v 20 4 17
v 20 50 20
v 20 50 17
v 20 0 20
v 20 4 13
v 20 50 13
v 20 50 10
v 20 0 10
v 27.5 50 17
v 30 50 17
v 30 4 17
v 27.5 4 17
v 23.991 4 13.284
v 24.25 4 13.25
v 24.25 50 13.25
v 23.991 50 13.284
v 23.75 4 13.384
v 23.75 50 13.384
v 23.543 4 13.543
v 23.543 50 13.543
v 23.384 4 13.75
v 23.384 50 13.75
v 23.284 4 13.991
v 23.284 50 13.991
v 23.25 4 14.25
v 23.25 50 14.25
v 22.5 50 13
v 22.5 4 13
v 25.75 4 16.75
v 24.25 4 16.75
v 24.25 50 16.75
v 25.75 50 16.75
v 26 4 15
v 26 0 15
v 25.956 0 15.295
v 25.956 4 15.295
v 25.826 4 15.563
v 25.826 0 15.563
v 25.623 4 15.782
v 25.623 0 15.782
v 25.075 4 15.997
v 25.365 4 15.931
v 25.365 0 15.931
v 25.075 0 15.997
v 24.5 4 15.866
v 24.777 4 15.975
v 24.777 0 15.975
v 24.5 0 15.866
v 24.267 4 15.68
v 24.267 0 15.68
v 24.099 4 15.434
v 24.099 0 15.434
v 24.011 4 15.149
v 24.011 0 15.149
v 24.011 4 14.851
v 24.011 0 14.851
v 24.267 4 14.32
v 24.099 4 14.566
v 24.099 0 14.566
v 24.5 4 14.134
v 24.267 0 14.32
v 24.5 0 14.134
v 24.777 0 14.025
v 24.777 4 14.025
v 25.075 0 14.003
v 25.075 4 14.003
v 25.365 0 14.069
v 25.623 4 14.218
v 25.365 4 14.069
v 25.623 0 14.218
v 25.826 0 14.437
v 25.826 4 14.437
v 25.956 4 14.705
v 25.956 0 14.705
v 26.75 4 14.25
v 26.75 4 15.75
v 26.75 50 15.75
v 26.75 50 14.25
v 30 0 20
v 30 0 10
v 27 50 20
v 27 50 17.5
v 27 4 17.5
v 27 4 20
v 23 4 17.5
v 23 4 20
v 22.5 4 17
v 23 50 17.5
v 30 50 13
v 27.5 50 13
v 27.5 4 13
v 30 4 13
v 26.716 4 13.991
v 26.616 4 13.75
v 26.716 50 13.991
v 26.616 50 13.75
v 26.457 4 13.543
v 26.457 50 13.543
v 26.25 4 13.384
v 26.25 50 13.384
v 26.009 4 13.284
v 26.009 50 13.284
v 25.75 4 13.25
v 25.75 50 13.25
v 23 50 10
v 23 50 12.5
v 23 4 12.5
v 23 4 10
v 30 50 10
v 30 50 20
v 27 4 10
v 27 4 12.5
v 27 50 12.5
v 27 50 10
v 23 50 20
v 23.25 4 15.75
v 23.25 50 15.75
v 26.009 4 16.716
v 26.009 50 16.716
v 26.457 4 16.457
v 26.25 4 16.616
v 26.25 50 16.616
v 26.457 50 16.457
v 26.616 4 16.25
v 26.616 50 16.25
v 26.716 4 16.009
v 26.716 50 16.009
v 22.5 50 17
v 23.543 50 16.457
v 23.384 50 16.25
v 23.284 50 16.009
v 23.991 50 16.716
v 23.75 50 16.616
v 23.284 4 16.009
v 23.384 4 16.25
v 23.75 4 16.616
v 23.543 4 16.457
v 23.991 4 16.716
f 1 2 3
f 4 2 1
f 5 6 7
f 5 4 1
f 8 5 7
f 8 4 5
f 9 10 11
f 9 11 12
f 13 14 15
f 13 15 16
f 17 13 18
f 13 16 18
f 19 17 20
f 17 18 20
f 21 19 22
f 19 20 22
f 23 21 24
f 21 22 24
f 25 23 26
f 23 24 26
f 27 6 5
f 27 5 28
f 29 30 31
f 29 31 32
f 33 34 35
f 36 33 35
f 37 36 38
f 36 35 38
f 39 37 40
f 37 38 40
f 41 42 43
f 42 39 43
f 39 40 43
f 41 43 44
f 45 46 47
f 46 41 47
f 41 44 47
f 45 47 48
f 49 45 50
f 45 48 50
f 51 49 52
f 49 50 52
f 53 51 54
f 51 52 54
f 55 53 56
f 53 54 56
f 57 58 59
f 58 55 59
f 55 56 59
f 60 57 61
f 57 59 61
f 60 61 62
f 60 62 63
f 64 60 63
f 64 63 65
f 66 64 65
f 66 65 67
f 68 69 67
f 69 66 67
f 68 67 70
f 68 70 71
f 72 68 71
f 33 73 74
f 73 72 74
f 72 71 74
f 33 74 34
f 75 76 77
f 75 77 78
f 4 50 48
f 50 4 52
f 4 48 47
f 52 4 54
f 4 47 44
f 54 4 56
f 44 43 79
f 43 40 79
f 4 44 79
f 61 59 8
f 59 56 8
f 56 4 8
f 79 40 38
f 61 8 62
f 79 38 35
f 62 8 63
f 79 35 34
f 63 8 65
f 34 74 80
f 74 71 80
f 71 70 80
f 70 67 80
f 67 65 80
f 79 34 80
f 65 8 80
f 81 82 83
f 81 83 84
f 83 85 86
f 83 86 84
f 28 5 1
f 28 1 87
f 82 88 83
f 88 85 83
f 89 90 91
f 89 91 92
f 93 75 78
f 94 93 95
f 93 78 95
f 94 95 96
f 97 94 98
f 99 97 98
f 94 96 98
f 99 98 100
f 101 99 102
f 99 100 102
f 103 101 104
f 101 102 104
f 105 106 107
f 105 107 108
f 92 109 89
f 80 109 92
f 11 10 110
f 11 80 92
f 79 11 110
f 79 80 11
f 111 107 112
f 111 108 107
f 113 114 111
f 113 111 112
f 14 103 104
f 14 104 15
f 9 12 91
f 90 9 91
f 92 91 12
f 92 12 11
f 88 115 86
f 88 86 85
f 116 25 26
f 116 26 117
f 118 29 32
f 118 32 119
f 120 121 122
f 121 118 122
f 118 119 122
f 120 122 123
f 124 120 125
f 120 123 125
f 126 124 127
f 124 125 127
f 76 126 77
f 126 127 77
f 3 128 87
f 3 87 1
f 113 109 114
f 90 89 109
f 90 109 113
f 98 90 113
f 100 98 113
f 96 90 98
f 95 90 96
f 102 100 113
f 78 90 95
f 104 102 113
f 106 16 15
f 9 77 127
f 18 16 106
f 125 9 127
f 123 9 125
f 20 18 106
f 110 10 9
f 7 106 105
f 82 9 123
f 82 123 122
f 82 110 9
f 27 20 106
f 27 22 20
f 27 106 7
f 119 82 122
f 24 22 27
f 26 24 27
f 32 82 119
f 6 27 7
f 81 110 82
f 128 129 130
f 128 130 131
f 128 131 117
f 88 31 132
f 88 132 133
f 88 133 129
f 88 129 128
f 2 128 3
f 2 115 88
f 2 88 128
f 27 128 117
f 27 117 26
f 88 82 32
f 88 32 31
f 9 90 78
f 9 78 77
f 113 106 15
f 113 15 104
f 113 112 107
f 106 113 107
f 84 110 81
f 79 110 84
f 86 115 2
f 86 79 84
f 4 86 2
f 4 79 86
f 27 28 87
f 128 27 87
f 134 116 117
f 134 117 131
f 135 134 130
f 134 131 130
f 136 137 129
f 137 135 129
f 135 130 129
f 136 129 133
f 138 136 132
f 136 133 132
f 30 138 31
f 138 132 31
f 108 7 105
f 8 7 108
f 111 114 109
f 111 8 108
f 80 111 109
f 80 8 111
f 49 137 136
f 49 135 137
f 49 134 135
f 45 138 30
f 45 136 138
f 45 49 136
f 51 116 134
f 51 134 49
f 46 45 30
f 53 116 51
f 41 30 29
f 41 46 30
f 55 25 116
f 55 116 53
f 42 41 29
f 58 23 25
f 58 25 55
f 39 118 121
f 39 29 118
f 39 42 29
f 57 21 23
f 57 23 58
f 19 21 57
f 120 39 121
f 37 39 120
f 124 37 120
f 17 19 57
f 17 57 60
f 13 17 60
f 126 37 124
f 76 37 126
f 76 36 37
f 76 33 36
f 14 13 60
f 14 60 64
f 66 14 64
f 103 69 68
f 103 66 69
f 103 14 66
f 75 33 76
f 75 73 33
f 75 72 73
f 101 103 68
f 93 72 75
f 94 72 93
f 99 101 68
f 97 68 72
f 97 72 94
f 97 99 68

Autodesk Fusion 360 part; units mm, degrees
sketch "Esquisse1" plane through (0, 0, 0) normal (0, 1, 0) x (1, 0, 0)
  line L0 (30, -20) -> (20, -20)
  line L1 (20, -20) -> (20, -10)
  line L2 (20, -10) -> (30, -10)
  line L3 (30, -10) -> (30, -20)
  circle A0 centre (25, -15) radius 1
  dimension "d1" = 10
  dimension "d2" = 10
  dimension "d22" = 2
extrude "Extrusion3" add sketch "Esquisse1" along normal blind 4
sketch "Esquisse3" plane through (0, 4, 0) normal (0, 1, 0) x (-1, 0, 0)
  circle A0 centre (-25, 15) radius 1
  line L0 (-30, 10) -> (-20, 10)
  line L1 (-20, 10) -> (-20, 20)
  line L2 (-20, 20) -> (-30, 20)
  line L3 (-30, 20) -> (-30, 10)
  line L4 (-30, 20) -> (-30, 17)
  line L5 (-30, 17) -> (-27.5, 17)
  line L6 (-27.5, 17) -> (-27.5, 15)
  line L7 (-27.5, 15) -> (-27, 15)
  line L8 (-25, 16.75) -> (-25, 17.5)
  line L9 (-25, 17.5) -> (-27, 17.5)
  line L10 (-27, 17.5) -> (-27, 20)
  line L11 (-27, 20) -> (-30, 20)
  line L12 (-30, 17) -> (-30, 20)
  line L13 (-26.75, 15) -> (-27.625, 15)
  line L14 (-25, 17.5) -> (-25, 17)
  line L15 (-25, 16.75) -> (-26.75, 16.75)
  line L16 (-26.75, 16.75) -> (-26.75, 15)
  line L17 (-27.5, 13) -> (-30, 13)
  line L18 (-30, 13) -> (-30, 10)
  line L19 (-30, 10) -> (-27, 10)
  line L20 (-27, 12.5) -> (-25, 12.5)
  line L21 (-25, 12.5) -> (-25, 13)
  line L22 (-27, 10) -> (-27, 12.5)
  line L23 (-25, 13.25) -> (-25, 12.375)
  line L24 (-26.75, 13.25) -> (-25, 13.25)
  line L25 (-26.75, 15) -> (-26.75, 13.25)
  line L26 (-26.75, 15) -> (-27.5, 15)
  line L27 (-27.5, 15) -> (-27.5, 13)
  line L28 (-23, 12.5) -> (-23, 10)
  line L29 (-23, 10) -> (-20, 10)
  line L30 (-20, 10) -> (-20, 13)
  line L31 (-22.5, 13) -> (-22.5, 15)
  line L32 (-22.5, 15) -> (-23, 15)
  line L33 (-20, 13) -> (-22.5, 13)
  line L34 (-23.25, 15) -> (-22.375, 15)
  line L35 (-23.25, 13.25) -> (-23.25, 15)
  line L36 (-25, 13.25) -> (-23.25, 13.25)
  line L37 (-25, 13.25) -> (-25, 12.5)
  line L38 (-25, 12.5) -> (-23, 12.5)
  line L39 (-22.5, 17) -> (-20, 17)
  line L40 (-20, 17) -> (-20, 20)
  line L41 (-20, 20) -> (-23, 20)
  line L42 (-23, 17.5) -> (-25, 17.5)
  line L43 (-25, 17.5) -> (-25, 17)
  line L44 (-23, 20) -> (-23, 17.5)
  line L45 (-25, 16.75) -> (-25, 17.625)
  line L46 (-23.25, 16.75) -> (-25, 16.75)
  line L47 (-23.25, 15) -> (-23.25, 16.75)
  line L48 (-23.25, 15) -> (-22.5, 15)
  line L49 (-22.5, 15) -> (-22.5, 17)
  dimension "d19" = 2.5
  dimension "d20" = 2
  dimension "d21" = 2.5
  dimension "d25" = 360
  dimension "d27" = 0.75
  dimension "d28" = 0.75
  dimension "d36" = 4
  dimension "d37" = 3
  dimension "d38" = 3
extrude "Extrusion6" add sketch "Esquisse3" along normal blind 46 contours L0 L3 L7 L13 L17 L18 L19 L20 L21 L22 L23 L24 L25 L26 L27 L37 | L0 L1 L21 L23 L28 L29 L30 L31 L32 L33 L34 L35 L36 L37 L38 L48 | L2 L3 L4 L5 L6 L7 L8 L9 L10 L11 L12 L13 L14 L15 L16 L26 L43 L45 | L1 L2 L8 L14 L32 L34 L39 L40 L41 L42 L43 L44 L45 L46 L47 L48 L49
fillet "Congé2" radius 1 4 edges at (23.25, 27, 13.25) (26.75, 27, 13.25) (26.75, 27, 16.75) (23.25, 27, 16.75)
